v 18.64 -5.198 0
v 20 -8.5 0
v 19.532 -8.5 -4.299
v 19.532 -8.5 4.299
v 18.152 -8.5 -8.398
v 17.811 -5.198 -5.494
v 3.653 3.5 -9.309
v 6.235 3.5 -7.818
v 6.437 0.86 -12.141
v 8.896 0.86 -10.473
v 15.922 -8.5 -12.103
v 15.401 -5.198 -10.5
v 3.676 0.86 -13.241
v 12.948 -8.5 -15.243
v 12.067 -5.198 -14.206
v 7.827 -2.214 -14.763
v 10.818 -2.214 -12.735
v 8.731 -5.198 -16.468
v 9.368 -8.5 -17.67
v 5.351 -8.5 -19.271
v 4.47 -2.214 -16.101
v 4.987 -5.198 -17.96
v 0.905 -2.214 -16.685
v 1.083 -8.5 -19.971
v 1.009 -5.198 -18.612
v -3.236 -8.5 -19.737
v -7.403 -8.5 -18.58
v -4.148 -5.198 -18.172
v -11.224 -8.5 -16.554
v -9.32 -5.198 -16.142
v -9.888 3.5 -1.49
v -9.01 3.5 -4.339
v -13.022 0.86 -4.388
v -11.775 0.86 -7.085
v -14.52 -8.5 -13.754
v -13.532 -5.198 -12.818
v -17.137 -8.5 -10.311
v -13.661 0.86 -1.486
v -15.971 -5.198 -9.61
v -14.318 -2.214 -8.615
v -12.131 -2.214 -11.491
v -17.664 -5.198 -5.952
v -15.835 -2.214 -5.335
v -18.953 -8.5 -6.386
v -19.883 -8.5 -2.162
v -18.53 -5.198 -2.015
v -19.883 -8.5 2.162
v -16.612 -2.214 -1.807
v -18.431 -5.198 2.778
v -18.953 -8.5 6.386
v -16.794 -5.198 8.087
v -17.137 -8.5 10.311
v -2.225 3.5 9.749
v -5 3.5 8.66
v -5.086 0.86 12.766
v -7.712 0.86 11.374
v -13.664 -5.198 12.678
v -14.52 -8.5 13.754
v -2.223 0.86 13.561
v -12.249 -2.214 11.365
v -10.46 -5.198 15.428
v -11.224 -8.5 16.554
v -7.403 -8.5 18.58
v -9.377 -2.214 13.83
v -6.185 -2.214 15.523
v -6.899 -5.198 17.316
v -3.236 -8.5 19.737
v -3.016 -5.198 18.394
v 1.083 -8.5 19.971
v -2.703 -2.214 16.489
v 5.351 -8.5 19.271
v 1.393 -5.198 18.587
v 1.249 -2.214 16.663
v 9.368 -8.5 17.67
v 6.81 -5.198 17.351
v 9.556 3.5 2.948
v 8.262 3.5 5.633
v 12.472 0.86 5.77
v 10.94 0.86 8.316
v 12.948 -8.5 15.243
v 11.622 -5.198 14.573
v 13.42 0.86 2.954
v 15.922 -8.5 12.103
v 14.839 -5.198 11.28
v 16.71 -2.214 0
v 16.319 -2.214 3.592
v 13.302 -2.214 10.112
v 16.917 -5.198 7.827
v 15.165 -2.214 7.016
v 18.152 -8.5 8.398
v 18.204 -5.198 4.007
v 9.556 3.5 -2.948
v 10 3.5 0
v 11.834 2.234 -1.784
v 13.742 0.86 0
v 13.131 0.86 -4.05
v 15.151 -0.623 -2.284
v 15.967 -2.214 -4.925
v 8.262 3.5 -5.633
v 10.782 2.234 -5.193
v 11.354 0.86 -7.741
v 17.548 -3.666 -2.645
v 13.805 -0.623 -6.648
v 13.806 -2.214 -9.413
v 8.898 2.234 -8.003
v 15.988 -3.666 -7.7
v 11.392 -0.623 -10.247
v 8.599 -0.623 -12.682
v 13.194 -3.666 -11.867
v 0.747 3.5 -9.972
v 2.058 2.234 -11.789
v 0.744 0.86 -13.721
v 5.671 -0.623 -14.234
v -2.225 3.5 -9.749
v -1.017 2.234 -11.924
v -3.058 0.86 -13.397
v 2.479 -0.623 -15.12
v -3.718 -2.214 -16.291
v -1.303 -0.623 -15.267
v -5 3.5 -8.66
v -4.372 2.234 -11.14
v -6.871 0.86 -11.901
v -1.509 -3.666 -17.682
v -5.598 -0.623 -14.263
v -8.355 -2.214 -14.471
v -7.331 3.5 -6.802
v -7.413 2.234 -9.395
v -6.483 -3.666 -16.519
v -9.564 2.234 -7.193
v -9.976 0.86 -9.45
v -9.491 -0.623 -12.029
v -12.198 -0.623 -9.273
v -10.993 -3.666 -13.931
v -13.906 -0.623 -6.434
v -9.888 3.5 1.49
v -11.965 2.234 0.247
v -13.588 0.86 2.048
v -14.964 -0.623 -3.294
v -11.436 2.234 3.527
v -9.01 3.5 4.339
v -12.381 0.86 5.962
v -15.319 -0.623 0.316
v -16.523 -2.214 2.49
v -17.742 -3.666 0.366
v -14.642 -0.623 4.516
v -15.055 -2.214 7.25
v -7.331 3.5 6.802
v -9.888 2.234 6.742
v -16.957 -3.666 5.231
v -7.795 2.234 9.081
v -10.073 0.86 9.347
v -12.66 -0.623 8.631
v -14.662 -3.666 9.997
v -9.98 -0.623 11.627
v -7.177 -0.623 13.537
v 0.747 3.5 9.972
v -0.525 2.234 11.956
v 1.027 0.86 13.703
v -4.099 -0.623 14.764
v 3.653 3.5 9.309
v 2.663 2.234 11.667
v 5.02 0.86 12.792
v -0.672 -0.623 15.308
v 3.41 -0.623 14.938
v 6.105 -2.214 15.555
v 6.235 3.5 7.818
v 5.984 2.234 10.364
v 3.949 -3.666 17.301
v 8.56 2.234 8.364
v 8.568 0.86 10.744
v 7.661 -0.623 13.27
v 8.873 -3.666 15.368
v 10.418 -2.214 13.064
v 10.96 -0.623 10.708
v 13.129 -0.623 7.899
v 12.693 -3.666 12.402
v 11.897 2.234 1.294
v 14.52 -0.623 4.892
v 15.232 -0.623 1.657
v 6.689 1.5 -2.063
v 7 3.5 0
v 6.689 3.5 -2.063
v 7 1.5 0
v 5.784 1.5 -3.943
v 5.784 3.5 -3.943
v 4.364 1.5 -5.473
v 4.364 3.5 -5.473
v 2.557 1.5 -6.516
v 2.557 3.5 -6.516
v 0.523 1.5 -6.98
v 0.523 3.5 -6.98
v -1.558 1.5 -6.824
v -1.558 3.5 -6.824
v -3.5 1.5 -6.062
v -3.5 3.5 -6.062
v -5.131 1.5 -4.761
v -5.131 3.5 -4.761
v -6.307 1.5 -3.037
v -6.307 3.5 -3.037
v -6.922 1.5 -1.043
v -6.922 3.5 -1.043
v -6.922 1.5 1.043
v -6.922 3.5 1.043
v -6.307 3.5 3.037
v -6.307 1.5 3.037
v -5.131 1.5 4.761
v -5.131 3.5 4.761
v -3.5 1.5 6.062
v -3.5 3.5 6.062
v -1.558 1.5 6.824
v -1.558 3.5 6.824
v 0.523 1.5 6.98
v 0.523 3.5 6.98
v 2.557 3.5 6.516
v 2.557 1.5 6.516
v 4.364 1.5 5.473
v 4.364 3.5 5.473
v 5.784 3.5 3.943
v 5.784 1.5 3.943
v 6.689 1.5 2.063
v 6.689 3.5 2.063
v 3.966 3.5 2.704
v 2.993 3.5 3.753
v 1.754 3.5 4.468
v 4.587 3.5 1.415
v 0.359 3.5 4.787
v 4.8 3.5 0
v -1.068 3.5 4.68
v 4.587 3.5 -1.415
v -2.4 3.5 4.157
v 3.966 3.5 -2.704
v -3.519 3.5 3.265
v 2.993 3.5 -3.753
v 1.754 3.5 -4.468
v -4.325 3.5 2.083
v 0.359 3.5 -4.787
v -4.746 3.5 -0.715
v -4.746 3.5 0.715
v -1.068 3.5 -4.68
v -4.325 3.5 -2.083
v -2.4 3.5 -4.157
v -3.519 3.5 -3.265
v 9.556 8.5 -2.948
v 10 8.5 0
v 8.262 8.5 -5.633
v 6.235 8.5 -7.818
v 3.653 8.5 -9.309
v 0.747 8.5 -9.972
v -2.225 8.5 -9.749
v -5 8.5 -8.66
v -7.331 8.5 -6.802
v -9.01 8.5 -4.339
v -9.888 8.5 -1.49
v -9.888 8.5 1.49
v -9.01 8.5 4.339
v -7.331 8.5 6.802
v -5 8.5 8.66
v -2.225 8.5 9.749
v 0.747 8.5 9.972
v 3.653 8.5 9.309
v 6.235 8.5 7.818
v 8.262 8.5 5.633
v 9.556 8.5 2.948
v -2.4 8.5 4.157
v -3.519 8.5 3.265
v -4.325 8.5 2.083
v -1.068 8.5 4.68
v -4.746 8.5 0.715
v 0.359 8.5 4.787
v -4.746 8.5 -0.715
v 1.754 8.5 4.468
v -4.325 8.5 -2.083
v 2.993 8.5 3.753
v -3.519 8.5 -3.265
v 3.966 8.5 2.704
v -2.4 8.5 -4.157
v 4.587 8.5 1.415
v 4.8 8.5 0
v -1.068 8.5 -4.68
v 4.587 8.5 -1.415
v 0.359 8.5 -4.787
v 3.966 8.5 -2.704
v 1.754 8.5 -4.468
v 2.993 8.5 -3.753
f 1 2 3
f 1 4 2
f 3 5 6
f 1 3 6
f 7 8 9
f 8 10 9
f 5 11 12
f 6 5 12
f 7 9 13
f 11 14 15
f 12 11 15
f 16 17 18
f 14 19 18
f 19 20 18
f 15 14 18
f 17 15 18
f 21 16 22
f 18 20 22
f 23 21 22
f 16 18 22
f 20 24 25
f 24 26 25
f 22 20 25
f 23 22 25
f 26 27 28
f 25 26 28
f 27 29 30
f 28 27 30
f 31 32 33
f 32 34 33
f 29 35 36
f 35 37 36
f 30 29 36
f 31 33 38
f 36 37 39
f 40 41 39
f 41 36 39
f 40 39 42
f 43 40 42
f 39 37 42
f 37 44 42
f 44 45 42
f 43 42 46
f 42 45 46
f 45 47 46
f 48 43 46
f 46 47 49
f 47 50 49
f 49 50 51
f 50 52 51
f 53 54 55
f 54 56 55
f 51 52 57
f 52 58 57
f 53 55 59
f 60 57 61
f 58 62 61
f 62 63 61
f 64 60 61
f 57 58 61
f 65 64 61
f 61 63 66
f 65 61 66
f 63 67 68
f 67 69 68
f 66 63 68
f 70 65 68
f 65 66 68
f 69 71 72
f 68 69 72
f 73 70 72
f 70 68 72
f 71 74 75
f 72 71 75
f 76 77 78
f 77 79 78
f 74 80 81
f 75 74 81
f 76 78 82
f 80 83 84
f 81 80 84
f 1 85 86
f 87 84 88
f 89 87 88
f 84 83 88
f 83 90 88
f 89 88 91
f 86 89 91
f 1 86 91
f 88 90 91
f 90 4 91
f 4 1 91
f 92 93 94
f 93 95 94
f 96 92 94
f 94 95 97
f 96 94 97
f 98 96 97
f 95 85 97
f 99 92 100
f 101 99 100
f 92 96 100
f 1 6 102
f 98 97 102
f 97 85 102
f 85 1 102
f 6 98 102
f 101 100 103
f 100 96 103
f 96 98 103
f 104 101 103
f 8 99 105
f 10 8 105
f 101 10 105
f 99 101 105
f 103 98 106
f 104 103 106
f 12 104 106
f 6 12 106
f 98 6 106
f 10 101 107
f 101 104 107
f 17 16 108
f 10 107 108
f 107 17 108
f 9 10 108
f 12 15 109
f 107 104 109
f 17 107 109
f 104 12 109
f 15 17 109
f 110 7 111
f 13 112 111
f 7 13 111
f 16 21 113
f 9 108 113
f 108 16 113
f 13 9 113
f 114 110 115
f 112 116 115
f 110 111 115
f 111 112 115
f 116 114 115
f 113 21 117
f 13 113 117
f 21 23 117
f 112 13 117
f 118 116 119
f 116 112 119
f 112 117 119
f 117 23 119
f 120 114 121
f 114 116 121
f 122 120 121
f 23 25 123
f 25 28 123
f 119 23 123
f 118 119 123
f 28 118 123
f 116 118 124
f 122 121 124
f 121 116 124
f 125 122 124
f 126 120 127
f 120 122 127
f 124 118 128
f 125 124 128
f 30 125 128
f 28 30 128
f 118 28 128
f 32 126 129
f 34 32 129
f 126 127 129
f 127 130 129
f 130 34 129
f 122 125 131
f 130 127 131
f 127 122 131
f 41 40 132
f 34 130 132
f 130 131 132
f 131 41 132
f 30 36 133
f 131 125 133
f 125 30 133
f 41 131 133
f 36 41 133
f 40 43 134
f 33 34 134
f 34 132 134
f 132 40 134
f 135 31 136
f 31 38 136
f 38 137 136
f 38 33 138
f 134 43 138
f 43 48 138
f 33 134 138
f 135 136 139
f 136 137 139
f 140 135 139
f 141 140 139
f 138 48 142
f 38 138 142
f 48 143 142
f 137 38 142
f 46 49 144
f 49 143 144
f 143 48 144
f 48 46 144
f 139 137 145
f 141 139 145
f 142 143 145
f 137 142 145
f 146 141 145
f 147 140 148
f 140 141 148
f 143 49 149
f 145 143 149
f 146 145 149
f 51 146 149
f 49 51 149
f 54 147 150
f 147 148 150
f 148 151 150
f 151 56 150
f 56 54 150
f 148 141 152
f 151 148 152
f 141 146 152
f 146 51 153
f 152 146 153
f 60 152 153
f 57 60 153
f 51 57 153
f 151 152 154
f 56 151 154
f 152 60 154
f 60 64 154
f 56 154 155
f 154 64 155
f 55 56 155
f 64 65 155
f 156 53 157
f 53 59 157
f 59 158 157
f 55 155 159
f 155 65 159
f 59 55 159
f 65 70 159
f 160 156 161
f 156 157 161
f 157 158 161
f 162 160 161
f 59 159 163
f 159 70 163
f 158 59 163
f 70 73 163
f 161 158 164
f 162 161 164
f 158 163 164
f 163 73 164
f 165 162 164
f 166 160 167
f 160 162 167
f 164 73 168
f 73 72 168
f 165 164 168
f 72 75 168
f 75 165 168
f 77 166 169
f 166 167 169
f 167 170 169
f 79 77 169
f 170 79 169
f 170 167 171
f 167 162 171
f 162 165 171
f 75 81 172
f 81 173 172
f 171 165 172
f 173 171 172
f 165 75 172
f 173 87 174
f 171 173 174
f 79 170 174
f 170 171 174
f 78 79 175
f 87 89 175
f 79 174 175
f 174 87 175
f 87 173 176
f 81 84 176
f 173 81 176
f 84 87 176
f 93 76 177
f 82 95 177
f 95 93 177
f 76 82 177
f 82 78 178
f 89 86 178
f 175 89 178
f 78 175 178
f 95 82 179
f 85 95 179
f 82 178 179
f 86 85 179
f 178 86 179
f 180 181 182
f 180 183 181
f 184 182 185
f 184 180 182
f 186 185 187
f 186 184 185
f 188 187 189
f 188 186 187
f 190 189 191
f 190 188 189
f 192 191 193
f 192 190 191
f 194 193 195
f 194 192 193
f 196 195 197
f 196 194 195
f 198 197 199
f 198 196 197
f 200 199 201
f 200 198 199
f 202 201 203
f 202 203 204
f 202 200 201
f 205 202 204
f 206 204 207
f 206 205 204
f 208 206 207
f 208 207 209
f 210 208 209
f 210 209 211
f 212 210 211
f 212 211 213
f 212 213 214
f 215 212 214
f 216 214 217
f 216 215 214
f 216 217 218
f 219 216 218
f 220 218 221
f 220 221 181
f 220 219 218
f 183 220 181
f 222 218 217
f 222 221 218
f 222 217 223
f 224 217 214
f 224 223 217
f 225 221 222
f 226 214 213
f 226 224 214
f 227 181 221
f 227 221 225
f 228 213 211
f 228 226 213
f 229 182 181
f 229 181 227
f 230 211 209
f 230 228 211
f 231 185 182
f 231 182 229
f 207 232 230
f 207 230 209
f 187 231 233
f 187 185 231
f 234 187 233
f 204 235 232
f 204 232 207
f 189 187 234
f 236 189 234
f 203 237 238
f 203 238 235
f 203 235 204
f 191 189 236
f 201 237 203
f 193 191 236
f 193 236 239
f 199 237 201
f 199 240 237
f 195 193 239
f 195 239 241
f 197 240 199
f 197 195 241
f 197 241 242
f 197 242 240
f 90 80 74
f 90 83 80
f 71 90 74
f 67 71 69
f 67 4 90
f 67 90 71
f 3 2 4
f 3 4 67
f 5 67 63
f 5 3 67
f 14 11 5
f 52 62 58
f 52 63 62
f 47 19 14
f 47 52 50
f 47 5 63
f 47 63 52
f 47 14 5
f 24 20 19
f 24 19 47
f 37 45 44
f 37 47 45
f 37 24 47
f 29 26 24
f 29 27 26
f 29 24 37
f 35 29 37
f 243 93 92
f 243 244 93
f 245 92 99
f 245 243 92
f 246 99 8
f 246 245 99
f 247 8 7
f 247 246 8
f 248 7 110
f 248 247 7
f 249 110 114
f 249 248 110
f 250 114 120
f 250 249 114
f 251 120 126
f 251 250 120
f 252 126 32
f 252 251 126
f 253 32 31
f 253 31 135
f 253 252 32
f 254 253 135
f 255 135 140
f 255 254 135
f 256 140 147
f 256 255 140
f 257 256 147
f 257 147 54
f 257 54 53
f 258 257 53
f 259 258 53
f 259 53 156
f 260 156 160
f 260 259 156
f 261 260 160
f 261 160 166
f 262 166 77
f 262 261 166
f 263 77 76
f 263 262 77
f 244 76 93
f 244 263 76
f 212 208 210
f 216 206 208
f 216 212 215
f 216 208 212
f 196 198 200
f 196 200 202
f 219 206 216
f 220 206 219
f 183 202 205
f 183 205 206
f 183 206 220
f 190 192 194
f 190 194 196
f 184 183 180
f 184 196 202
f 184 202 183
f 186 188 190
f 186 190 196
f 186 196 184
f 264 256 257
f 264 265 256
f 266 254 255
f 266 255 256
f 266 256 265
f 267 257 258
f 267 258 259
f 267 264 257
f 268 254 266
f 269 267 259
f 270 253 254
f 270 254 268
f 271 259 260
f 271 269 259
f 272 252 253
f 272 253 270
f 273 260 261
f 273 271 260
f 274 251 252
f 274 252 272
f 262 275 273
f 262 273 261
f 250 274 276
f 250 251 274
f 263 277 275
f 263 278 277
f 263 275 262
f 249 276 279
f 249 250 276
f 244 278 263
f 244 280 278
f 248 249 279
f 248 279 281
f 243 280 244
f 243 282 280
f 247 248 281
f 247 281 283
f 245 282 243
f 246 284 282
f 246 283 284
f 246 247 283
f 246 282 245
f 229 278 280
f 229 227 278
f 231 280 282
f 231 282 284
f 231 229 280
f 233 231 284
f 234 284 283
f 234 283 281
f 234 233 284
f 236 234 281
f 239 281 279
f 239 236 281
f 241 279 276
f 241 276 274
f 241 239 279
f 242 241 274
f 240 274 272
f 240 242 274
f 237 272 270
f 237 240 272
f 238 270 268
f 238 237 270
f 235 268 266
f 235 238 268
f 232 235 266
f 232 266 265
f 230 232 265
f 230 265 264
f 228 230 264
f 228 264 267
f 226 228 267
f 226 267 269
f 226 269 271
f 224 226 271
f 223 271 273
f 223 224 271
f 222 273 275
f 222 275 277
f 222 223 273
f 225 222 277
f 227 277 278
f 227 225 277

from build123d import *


with BuildPart() as part:
    # Sketch2 → Revolve3 (revolve)
    with BuildSketch(Plane.XY):
        with BuildLine():
            Line((0, -8.5), (20, -8.5))
            add(Edge.make_bspline(
                [(10, 3.5), (17.670847147, -1.003355788), (20, -8.5)],
                knots=[0, 0, 0, 1, 1, 1], degree=2))
            Line((10, 3.5), (10, 8.5))
            Line((10, 8.5), (4.8, 8.5))
            Line((4.8, 8.5), (4.8, 3.5))
            Line((4.8, 3.5), (7, 3.5))
            Line((7, 3.5), (7, 1.5))
            Line((7, 1.5), (0, 1.5))
            Line((0, 1.5), (0, -8.5))
        make_face()
    revolve(axis=Axis((0, -1018.947859526, 0), (0, 1, 0)))


solid = part.part
